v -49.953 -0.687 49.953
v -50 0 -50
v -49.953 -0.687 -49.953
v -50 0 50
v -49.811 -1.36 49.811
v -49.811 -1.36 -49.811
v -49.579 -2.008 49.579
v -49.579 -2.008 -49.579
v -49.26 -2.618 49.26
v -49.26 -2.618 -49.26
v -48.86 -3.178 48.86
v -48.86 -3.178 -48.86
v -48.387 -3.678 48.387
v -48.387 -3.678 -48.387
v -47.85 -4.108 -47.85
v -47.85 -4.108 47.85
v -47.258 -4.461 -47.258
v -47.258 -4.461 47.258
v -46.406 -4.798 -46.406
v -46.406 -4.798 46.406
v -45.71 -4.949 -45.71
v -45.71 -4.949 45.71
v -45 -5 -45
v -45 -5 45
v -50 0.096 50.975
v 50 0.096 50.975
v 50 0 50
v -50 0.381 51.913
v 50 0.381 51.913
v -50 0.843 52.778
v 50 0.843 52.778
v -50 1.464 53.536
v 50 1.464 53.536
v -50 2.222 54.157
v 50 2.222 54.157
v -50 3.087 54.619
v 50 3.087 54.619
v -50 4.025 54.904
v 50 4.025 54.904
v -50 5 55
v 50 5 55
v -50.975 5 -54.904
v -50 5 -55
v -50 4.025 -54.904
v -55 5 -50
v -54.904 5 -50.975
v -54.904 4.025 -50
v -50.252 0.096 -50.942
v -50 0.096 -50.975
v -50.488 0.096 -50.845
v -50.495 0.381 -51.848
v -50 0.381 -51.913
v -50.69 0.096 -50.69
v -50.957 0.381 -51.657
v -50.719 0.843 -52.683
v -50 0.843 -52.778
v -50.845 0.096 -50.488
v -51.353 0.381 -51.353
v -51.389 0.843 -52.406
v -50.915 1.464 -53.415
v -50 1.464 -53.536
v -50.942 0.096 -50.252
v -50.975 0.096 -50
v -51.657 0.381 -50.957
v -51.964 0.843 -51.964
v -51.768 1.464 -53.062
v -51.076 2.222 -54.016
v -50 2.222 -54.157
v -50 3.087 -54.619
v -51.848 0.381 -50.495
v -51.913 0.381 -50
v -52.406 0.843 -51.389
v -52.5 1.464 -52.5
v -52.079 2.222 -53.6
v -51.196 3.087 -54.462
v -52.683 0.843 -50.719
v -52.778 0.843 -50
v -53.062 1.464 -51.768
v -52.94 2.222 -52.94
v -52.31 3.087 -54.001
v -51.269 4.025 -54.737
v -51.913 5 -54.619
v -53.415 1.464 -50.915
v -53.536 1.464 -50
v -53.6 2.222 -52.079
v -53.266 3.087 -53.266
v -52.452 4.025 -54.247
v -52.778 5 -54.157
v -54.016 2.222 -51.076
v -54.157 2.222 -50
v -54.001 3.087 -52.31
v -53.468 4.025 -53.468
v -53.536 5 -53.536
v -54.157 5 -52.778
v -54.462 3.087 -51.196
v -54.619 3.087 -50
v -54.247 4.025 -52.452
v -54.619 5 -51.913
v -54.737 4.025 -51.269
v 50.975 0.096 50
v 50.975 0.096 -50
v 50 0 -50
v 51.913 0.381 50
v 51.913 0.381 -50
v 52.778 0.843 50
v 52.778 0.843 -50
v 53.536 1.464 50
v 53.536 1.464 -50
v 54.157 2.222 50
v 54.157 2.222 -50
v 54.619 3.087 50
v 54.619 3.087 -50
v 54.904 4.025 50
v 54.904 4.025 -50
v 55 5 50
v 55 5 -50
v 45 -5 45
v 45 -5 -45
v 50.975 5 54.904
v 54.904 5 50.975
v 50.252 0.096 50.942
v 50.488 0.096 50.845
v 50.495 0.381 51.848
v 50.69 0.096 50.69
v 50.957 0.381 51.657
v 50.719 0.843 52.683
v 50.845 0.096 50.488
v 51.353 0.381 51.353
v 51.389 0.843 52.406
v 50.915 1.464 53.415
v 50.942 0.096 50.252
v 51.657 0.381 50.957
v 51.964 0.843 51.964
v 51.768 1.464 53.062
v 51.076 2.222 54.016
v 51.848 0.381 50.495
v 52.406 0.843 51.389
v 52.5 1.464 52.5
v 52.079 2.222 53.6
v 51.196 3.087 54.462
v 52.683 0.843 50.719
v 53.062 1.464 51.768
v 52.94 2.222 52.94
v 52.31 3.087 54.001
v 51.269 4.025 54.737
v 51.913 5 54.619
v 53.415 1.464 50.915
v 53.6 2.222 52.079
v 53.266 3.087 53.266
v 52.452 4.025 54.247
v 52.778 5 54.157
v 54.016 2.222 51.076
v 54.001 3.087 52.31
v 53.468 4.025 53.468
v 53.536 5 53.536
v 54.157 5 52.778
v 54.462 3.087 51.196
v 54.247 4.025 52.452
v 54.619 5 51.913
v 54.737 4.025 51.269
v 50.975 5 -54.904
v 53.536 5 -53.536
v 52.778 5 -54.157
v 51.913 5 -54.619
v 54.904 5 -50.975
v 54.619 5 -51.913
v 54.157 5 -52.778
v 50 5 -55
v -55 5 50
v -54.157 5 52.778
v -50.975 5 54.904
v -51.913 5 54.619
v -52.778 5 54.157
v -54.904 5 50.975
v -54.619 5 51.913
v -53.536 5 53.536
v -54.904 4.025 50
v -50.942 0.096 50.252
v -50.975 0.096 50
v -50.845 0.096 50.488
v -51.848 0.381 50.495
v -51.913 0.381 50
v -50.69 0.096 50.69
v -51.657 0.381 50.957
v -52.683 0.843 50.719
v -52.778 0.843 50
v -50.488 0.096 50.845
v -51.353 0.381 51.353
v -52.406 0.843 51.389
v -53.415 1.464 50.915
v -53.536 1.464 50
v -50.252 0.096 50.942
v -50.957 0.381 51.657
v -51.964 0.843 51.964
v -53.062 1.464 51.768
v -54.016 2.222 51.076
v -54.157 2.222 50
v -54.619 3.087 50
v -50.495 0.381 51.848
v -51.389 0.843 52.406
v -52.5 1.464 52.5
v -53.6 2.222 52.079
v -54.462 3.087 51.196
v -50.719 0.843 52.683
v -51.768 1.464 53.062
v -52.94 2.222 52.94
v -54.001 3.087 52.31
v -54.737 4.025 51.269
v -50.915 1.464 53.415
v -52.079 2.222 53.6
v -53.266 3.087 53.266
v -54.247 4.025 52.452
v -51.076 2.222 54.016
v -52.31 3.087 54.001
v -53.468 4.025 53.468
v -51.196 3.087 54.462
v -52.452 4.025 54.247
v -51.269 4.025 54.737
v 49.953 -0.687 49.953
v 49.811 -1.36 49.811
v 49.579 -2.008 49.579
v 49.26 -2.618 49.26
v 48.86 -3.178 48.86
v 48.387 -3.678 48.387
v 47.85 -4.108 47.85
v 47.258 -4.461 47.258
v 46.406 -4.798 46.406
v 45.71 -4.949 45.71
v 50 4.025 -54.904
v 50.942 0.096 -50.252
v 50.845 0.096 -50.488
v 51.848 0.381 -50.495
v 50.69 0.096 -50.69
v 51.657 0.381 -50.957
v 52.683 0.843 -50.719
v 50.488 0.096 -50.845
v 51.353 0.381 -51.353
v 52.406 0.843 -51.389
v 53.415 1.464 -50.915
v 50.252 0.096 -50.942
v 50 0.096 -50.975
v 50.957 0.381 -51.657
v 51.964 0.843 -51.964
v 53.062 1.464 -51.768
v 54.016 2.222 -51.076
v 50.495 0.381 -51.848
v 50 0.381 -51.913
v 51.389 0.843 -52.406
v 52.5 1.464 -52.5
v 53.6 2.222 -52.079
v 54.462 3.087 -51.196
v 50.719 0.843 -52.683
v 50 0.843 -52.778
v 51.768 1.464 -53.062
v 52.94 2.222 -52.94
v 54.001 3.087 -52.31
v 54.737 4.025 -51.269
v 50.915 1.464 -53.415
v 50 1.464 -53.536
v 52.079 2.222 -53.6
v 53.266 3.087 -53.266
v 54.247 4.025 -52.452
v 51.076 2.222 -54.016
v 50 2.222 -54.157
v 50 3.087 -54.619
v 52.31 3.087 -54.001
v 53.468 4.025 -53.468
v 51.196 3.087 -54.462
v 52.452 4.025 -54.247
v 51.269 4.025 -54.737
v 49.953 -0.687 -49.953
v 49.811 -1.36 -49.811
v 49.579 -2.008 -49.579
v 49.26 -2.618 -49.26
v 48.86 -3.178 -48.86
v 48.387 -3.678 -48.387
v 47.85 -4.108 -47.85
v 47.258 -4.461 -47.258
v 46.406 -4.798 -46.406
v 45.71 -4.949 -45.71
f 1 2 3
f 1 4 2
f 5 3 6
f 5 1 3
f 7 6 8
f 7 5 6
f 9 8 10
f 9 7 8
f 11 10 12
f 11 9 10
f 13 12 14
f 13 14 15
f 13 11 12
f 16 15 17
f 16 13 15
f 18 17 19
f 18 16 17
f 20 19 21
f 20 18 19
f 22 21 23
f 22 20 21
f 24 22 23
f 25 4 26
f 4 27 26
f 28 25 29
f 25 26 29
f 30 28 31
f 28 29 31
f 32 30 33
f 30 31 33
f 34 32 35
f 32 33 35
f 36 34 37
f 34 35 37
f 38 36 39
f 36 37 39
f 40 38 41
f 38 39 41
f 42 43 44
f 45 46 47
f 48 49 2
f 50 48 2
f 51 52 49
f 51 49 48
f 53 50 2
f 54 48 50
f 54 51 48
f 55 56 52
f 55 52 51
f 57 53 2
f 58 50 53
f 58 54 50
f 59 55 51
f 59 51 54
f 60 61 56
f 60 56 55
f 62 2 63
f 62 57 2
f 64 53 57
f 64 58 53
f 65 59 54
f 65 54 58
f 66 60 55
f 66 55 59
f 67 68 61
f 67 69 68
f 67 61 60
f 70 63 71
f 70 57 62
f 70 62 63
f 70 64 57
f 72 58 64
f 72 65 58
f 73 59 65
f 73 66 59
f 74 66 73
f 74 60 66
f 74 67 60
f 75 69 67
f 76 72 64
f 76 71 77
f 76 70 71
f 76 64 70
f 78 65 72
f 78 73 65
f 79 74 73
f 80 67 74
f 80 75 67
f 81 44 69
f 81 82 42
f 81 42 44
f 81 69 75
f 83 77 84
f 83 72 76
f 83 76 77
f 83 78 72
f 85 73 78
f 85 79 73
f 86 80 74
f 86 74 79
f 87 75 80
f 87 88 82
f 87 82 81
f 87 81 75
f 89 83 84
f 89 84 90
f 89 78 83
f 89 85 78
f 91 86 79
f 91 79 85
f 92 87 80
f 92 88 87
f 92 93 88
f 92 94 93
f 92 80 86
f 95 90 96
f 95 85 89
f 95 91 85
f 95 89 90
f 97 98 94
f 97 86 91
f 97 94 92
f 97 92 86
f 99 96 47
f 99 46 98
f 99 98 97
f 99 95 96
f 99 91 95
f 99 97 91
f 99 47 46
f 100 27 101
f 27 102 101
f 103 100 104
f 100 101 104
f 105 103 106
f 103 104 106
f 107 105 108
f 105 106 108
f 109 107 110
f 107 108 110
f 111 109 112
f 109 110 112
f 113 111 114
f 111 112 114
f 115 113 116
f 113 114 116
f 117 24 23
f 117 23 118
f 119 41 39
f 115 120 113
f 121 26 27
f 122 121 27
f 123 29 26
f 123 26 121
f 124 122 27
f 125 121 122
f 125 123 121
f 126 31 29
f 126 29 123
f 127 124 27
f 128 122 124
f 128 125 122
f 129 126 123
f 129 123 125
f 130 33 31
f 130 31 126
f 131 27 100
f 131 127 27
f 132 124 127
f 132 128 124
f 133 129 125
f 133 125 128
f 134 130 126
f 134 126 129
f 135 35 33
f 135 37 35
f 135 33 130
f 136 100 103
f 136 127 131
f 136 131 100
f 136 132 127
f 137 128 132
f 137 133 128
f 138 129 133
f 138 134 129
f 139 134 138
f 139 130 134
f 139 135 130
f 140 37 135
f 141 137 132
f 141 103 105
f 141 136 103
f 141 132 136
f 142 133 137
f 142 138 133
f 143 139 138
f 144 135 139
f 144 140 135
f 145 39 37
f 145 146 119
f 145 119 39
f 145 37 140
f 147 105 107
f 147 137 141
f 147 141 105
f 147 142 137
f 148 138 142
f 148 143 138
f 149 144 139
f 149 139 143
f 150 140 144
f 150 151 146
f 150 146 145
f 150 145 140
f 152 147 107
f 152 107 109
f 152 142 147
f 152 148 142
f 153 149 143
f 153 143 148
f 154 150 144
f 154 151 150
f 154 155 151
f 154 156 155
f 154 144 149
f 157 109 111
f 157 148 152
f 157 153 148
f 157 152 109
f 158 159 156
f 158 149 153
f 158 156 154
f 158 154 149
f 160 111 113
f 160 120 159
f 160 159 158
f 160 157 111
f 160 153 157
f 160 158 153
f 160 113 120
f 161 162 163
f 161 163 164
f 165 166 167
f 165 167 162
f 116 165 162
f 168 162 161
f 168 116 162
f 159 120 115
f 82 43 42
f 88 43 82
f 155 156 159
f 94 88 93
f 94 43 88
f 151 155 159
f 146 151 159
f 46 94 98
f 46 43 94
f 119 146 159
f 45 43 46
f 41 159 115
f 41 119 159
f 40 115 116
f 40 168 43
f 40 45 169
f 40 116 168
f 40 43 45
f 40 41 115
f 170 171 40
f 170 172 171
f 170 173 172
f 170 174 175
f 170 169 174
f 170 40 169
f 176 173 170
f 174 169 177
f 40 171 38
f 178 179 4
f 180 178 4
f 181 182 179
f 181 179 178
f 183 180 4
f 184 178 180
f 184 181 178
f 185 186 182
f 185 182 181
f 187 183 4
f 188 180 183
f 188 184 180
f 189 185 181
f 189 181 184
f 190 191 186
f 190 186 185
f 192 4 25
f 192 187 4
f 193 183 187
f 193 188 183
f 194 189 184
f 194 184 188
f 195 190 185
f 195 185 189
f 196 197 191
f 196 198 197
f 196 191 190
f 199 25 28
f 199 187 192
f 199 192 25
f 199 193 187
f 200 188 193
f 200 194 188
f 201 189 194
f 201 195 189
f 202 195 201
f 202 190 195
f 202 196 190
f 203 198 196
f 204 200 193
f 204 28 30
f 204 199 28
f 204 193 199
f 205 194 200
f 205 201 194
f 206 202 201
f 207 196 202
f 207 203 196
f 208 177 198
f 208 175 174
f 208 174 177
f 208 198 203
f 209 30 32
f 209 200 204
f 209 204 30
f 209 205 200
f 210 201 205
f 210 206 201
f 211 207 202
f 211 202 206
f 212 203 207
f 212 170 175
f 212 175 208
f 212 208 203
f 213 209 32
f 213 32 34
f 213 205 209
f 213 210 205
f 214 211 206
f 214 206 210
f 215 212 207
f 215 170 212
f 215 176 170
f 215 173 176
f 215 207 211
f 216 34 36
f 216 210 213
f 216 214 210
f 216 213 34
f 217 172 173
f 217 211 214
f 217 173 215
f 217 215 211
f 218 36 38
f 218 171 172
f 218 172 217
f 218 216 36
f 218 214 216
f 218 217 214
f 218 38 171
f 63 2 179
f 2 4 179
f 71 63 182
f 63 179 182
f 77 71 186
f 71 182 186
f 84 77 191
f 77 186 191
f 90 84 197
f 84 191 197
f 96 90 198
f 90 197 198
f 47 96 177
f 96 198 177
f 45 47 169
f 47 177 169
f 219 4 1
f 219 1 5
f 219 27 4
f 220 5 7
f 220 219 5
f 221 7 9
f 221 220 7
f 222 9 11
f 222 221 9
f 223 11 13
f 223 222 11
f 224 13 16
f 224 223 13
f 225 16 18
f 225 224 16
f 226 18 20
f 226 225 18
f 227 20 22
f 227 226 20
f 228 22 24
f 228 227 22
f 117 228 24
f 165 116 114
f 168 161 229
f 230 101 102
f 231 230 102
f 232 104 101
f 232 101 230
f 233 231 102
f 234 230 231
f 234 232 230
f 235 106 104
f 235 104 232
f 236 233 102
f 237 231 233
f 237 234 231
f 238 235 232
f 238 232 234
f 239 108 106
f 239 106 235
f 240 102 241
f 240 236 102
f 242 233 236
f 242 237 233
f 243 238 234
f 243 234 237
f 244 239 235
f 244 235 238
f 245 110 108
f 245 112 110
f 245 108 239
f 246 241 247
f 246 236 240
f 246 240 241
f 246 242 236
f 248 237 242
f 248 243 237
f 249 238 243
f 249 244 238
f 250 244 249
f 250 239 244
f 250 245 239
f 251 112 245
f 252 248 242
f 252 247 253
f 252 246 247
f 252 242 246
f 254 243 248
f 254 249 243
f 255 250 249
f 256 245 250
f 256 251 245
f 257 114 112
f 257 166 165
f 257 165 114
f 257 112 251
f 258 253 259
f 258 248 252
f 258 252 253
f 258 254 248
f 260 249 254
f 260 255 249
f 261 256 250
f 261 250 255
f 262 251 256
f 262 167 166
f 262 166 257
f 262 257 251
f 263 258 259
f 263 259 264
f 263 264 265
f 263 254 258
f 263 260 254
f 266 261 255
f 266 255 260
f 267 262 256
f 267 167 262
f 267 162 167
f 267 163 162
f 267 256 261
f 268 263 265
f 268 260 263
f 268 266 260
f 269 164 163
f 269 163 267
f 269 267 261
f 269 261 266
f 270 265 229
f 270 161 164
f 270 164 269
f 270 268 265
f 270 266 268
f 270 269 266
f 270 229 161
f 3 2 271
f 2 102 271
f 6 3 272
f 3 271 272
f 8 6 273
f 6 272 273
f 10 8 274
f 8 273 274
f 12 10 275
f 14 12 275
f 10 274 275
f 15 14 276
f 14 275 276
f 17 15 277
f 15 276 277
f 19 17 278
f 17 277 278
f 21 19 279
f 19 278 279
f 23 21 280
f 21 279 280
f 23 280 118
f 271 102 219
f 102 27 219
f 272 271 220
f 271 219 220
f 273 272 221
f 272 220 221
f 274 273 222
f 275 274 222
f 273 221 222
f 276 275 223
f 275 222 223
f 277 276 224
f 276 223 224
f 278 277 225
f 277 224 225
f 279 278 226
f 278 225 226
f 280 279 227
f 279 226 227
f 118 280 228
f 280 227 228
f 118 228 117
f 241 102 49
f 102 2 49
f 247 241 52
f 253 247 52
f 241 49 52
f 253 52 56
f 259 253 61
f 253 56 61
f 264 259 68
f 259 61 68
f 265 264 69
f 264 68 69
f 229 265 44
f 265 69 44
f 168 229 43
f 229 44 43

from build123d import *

# Parameters (mm, degrees)
F0_W     = 100
F0_H     = 100
F1_DEPTH = 5
F2_W     = 110
F2_H     = 110
F3_DEPTH = 5
F4_R     = 5
F5_R     = 4.99999
F6_R     = 4.99999


# Not quite as in the source:
# - a fillet or chamfer is up to 0.001 mm smaller than in the source, because OpenCascade refuses the exact size


with BuildPart() as f1:
    # F0 (on Front) → F1 (new body)
    with BuildSketch(Plane.XZ):
        Rectangle(F0_W, F0_H)
    extrude(amount=F1_DEPTH)

    # F2 (on face) → F3 (join)
    with BuildSketch(Plane(origin=(0, 0, 0), x_dir=(-1, 0, 0), z_dir=(0, 1, 0))):
        Rectangle(F2_W, F2_H)
    extrude(amount=F3_DEPTH)

    # F4
    f4_edges = [f1.edges().sort_by_distance(p)[0] for p in [
        (-55, 2.5, -55),
        (55, 2.5, -55),
        (55, 2.5, 55),
        (-55, 2.5, 55),
    ]]
    fillet(f4_edges, radius=F4_R)

    # F5 (radius 5 in the source; OpenCascade refuses exactly that, so slightly less here)
    f5_edges = [f1.edges().sort_by_distance(p)[0] for p in [
        (0, -5, 50),
        (50, -5, 0),
        (0, -5, -50),
        (-50, -5, 0),
    ]]
    fillet(f5_edges, radius=F5_R)

    # F6 (radius 5 in the source; OpenCascade refuses exactly that, so slightly less here)
    f6_edges = [f1.edges().sort_by_distance(p)[0] for p in [
        (0, 0, -55),
    ]]
    fillet(f6_edges, radius=F6_R)


solid = f1.part
